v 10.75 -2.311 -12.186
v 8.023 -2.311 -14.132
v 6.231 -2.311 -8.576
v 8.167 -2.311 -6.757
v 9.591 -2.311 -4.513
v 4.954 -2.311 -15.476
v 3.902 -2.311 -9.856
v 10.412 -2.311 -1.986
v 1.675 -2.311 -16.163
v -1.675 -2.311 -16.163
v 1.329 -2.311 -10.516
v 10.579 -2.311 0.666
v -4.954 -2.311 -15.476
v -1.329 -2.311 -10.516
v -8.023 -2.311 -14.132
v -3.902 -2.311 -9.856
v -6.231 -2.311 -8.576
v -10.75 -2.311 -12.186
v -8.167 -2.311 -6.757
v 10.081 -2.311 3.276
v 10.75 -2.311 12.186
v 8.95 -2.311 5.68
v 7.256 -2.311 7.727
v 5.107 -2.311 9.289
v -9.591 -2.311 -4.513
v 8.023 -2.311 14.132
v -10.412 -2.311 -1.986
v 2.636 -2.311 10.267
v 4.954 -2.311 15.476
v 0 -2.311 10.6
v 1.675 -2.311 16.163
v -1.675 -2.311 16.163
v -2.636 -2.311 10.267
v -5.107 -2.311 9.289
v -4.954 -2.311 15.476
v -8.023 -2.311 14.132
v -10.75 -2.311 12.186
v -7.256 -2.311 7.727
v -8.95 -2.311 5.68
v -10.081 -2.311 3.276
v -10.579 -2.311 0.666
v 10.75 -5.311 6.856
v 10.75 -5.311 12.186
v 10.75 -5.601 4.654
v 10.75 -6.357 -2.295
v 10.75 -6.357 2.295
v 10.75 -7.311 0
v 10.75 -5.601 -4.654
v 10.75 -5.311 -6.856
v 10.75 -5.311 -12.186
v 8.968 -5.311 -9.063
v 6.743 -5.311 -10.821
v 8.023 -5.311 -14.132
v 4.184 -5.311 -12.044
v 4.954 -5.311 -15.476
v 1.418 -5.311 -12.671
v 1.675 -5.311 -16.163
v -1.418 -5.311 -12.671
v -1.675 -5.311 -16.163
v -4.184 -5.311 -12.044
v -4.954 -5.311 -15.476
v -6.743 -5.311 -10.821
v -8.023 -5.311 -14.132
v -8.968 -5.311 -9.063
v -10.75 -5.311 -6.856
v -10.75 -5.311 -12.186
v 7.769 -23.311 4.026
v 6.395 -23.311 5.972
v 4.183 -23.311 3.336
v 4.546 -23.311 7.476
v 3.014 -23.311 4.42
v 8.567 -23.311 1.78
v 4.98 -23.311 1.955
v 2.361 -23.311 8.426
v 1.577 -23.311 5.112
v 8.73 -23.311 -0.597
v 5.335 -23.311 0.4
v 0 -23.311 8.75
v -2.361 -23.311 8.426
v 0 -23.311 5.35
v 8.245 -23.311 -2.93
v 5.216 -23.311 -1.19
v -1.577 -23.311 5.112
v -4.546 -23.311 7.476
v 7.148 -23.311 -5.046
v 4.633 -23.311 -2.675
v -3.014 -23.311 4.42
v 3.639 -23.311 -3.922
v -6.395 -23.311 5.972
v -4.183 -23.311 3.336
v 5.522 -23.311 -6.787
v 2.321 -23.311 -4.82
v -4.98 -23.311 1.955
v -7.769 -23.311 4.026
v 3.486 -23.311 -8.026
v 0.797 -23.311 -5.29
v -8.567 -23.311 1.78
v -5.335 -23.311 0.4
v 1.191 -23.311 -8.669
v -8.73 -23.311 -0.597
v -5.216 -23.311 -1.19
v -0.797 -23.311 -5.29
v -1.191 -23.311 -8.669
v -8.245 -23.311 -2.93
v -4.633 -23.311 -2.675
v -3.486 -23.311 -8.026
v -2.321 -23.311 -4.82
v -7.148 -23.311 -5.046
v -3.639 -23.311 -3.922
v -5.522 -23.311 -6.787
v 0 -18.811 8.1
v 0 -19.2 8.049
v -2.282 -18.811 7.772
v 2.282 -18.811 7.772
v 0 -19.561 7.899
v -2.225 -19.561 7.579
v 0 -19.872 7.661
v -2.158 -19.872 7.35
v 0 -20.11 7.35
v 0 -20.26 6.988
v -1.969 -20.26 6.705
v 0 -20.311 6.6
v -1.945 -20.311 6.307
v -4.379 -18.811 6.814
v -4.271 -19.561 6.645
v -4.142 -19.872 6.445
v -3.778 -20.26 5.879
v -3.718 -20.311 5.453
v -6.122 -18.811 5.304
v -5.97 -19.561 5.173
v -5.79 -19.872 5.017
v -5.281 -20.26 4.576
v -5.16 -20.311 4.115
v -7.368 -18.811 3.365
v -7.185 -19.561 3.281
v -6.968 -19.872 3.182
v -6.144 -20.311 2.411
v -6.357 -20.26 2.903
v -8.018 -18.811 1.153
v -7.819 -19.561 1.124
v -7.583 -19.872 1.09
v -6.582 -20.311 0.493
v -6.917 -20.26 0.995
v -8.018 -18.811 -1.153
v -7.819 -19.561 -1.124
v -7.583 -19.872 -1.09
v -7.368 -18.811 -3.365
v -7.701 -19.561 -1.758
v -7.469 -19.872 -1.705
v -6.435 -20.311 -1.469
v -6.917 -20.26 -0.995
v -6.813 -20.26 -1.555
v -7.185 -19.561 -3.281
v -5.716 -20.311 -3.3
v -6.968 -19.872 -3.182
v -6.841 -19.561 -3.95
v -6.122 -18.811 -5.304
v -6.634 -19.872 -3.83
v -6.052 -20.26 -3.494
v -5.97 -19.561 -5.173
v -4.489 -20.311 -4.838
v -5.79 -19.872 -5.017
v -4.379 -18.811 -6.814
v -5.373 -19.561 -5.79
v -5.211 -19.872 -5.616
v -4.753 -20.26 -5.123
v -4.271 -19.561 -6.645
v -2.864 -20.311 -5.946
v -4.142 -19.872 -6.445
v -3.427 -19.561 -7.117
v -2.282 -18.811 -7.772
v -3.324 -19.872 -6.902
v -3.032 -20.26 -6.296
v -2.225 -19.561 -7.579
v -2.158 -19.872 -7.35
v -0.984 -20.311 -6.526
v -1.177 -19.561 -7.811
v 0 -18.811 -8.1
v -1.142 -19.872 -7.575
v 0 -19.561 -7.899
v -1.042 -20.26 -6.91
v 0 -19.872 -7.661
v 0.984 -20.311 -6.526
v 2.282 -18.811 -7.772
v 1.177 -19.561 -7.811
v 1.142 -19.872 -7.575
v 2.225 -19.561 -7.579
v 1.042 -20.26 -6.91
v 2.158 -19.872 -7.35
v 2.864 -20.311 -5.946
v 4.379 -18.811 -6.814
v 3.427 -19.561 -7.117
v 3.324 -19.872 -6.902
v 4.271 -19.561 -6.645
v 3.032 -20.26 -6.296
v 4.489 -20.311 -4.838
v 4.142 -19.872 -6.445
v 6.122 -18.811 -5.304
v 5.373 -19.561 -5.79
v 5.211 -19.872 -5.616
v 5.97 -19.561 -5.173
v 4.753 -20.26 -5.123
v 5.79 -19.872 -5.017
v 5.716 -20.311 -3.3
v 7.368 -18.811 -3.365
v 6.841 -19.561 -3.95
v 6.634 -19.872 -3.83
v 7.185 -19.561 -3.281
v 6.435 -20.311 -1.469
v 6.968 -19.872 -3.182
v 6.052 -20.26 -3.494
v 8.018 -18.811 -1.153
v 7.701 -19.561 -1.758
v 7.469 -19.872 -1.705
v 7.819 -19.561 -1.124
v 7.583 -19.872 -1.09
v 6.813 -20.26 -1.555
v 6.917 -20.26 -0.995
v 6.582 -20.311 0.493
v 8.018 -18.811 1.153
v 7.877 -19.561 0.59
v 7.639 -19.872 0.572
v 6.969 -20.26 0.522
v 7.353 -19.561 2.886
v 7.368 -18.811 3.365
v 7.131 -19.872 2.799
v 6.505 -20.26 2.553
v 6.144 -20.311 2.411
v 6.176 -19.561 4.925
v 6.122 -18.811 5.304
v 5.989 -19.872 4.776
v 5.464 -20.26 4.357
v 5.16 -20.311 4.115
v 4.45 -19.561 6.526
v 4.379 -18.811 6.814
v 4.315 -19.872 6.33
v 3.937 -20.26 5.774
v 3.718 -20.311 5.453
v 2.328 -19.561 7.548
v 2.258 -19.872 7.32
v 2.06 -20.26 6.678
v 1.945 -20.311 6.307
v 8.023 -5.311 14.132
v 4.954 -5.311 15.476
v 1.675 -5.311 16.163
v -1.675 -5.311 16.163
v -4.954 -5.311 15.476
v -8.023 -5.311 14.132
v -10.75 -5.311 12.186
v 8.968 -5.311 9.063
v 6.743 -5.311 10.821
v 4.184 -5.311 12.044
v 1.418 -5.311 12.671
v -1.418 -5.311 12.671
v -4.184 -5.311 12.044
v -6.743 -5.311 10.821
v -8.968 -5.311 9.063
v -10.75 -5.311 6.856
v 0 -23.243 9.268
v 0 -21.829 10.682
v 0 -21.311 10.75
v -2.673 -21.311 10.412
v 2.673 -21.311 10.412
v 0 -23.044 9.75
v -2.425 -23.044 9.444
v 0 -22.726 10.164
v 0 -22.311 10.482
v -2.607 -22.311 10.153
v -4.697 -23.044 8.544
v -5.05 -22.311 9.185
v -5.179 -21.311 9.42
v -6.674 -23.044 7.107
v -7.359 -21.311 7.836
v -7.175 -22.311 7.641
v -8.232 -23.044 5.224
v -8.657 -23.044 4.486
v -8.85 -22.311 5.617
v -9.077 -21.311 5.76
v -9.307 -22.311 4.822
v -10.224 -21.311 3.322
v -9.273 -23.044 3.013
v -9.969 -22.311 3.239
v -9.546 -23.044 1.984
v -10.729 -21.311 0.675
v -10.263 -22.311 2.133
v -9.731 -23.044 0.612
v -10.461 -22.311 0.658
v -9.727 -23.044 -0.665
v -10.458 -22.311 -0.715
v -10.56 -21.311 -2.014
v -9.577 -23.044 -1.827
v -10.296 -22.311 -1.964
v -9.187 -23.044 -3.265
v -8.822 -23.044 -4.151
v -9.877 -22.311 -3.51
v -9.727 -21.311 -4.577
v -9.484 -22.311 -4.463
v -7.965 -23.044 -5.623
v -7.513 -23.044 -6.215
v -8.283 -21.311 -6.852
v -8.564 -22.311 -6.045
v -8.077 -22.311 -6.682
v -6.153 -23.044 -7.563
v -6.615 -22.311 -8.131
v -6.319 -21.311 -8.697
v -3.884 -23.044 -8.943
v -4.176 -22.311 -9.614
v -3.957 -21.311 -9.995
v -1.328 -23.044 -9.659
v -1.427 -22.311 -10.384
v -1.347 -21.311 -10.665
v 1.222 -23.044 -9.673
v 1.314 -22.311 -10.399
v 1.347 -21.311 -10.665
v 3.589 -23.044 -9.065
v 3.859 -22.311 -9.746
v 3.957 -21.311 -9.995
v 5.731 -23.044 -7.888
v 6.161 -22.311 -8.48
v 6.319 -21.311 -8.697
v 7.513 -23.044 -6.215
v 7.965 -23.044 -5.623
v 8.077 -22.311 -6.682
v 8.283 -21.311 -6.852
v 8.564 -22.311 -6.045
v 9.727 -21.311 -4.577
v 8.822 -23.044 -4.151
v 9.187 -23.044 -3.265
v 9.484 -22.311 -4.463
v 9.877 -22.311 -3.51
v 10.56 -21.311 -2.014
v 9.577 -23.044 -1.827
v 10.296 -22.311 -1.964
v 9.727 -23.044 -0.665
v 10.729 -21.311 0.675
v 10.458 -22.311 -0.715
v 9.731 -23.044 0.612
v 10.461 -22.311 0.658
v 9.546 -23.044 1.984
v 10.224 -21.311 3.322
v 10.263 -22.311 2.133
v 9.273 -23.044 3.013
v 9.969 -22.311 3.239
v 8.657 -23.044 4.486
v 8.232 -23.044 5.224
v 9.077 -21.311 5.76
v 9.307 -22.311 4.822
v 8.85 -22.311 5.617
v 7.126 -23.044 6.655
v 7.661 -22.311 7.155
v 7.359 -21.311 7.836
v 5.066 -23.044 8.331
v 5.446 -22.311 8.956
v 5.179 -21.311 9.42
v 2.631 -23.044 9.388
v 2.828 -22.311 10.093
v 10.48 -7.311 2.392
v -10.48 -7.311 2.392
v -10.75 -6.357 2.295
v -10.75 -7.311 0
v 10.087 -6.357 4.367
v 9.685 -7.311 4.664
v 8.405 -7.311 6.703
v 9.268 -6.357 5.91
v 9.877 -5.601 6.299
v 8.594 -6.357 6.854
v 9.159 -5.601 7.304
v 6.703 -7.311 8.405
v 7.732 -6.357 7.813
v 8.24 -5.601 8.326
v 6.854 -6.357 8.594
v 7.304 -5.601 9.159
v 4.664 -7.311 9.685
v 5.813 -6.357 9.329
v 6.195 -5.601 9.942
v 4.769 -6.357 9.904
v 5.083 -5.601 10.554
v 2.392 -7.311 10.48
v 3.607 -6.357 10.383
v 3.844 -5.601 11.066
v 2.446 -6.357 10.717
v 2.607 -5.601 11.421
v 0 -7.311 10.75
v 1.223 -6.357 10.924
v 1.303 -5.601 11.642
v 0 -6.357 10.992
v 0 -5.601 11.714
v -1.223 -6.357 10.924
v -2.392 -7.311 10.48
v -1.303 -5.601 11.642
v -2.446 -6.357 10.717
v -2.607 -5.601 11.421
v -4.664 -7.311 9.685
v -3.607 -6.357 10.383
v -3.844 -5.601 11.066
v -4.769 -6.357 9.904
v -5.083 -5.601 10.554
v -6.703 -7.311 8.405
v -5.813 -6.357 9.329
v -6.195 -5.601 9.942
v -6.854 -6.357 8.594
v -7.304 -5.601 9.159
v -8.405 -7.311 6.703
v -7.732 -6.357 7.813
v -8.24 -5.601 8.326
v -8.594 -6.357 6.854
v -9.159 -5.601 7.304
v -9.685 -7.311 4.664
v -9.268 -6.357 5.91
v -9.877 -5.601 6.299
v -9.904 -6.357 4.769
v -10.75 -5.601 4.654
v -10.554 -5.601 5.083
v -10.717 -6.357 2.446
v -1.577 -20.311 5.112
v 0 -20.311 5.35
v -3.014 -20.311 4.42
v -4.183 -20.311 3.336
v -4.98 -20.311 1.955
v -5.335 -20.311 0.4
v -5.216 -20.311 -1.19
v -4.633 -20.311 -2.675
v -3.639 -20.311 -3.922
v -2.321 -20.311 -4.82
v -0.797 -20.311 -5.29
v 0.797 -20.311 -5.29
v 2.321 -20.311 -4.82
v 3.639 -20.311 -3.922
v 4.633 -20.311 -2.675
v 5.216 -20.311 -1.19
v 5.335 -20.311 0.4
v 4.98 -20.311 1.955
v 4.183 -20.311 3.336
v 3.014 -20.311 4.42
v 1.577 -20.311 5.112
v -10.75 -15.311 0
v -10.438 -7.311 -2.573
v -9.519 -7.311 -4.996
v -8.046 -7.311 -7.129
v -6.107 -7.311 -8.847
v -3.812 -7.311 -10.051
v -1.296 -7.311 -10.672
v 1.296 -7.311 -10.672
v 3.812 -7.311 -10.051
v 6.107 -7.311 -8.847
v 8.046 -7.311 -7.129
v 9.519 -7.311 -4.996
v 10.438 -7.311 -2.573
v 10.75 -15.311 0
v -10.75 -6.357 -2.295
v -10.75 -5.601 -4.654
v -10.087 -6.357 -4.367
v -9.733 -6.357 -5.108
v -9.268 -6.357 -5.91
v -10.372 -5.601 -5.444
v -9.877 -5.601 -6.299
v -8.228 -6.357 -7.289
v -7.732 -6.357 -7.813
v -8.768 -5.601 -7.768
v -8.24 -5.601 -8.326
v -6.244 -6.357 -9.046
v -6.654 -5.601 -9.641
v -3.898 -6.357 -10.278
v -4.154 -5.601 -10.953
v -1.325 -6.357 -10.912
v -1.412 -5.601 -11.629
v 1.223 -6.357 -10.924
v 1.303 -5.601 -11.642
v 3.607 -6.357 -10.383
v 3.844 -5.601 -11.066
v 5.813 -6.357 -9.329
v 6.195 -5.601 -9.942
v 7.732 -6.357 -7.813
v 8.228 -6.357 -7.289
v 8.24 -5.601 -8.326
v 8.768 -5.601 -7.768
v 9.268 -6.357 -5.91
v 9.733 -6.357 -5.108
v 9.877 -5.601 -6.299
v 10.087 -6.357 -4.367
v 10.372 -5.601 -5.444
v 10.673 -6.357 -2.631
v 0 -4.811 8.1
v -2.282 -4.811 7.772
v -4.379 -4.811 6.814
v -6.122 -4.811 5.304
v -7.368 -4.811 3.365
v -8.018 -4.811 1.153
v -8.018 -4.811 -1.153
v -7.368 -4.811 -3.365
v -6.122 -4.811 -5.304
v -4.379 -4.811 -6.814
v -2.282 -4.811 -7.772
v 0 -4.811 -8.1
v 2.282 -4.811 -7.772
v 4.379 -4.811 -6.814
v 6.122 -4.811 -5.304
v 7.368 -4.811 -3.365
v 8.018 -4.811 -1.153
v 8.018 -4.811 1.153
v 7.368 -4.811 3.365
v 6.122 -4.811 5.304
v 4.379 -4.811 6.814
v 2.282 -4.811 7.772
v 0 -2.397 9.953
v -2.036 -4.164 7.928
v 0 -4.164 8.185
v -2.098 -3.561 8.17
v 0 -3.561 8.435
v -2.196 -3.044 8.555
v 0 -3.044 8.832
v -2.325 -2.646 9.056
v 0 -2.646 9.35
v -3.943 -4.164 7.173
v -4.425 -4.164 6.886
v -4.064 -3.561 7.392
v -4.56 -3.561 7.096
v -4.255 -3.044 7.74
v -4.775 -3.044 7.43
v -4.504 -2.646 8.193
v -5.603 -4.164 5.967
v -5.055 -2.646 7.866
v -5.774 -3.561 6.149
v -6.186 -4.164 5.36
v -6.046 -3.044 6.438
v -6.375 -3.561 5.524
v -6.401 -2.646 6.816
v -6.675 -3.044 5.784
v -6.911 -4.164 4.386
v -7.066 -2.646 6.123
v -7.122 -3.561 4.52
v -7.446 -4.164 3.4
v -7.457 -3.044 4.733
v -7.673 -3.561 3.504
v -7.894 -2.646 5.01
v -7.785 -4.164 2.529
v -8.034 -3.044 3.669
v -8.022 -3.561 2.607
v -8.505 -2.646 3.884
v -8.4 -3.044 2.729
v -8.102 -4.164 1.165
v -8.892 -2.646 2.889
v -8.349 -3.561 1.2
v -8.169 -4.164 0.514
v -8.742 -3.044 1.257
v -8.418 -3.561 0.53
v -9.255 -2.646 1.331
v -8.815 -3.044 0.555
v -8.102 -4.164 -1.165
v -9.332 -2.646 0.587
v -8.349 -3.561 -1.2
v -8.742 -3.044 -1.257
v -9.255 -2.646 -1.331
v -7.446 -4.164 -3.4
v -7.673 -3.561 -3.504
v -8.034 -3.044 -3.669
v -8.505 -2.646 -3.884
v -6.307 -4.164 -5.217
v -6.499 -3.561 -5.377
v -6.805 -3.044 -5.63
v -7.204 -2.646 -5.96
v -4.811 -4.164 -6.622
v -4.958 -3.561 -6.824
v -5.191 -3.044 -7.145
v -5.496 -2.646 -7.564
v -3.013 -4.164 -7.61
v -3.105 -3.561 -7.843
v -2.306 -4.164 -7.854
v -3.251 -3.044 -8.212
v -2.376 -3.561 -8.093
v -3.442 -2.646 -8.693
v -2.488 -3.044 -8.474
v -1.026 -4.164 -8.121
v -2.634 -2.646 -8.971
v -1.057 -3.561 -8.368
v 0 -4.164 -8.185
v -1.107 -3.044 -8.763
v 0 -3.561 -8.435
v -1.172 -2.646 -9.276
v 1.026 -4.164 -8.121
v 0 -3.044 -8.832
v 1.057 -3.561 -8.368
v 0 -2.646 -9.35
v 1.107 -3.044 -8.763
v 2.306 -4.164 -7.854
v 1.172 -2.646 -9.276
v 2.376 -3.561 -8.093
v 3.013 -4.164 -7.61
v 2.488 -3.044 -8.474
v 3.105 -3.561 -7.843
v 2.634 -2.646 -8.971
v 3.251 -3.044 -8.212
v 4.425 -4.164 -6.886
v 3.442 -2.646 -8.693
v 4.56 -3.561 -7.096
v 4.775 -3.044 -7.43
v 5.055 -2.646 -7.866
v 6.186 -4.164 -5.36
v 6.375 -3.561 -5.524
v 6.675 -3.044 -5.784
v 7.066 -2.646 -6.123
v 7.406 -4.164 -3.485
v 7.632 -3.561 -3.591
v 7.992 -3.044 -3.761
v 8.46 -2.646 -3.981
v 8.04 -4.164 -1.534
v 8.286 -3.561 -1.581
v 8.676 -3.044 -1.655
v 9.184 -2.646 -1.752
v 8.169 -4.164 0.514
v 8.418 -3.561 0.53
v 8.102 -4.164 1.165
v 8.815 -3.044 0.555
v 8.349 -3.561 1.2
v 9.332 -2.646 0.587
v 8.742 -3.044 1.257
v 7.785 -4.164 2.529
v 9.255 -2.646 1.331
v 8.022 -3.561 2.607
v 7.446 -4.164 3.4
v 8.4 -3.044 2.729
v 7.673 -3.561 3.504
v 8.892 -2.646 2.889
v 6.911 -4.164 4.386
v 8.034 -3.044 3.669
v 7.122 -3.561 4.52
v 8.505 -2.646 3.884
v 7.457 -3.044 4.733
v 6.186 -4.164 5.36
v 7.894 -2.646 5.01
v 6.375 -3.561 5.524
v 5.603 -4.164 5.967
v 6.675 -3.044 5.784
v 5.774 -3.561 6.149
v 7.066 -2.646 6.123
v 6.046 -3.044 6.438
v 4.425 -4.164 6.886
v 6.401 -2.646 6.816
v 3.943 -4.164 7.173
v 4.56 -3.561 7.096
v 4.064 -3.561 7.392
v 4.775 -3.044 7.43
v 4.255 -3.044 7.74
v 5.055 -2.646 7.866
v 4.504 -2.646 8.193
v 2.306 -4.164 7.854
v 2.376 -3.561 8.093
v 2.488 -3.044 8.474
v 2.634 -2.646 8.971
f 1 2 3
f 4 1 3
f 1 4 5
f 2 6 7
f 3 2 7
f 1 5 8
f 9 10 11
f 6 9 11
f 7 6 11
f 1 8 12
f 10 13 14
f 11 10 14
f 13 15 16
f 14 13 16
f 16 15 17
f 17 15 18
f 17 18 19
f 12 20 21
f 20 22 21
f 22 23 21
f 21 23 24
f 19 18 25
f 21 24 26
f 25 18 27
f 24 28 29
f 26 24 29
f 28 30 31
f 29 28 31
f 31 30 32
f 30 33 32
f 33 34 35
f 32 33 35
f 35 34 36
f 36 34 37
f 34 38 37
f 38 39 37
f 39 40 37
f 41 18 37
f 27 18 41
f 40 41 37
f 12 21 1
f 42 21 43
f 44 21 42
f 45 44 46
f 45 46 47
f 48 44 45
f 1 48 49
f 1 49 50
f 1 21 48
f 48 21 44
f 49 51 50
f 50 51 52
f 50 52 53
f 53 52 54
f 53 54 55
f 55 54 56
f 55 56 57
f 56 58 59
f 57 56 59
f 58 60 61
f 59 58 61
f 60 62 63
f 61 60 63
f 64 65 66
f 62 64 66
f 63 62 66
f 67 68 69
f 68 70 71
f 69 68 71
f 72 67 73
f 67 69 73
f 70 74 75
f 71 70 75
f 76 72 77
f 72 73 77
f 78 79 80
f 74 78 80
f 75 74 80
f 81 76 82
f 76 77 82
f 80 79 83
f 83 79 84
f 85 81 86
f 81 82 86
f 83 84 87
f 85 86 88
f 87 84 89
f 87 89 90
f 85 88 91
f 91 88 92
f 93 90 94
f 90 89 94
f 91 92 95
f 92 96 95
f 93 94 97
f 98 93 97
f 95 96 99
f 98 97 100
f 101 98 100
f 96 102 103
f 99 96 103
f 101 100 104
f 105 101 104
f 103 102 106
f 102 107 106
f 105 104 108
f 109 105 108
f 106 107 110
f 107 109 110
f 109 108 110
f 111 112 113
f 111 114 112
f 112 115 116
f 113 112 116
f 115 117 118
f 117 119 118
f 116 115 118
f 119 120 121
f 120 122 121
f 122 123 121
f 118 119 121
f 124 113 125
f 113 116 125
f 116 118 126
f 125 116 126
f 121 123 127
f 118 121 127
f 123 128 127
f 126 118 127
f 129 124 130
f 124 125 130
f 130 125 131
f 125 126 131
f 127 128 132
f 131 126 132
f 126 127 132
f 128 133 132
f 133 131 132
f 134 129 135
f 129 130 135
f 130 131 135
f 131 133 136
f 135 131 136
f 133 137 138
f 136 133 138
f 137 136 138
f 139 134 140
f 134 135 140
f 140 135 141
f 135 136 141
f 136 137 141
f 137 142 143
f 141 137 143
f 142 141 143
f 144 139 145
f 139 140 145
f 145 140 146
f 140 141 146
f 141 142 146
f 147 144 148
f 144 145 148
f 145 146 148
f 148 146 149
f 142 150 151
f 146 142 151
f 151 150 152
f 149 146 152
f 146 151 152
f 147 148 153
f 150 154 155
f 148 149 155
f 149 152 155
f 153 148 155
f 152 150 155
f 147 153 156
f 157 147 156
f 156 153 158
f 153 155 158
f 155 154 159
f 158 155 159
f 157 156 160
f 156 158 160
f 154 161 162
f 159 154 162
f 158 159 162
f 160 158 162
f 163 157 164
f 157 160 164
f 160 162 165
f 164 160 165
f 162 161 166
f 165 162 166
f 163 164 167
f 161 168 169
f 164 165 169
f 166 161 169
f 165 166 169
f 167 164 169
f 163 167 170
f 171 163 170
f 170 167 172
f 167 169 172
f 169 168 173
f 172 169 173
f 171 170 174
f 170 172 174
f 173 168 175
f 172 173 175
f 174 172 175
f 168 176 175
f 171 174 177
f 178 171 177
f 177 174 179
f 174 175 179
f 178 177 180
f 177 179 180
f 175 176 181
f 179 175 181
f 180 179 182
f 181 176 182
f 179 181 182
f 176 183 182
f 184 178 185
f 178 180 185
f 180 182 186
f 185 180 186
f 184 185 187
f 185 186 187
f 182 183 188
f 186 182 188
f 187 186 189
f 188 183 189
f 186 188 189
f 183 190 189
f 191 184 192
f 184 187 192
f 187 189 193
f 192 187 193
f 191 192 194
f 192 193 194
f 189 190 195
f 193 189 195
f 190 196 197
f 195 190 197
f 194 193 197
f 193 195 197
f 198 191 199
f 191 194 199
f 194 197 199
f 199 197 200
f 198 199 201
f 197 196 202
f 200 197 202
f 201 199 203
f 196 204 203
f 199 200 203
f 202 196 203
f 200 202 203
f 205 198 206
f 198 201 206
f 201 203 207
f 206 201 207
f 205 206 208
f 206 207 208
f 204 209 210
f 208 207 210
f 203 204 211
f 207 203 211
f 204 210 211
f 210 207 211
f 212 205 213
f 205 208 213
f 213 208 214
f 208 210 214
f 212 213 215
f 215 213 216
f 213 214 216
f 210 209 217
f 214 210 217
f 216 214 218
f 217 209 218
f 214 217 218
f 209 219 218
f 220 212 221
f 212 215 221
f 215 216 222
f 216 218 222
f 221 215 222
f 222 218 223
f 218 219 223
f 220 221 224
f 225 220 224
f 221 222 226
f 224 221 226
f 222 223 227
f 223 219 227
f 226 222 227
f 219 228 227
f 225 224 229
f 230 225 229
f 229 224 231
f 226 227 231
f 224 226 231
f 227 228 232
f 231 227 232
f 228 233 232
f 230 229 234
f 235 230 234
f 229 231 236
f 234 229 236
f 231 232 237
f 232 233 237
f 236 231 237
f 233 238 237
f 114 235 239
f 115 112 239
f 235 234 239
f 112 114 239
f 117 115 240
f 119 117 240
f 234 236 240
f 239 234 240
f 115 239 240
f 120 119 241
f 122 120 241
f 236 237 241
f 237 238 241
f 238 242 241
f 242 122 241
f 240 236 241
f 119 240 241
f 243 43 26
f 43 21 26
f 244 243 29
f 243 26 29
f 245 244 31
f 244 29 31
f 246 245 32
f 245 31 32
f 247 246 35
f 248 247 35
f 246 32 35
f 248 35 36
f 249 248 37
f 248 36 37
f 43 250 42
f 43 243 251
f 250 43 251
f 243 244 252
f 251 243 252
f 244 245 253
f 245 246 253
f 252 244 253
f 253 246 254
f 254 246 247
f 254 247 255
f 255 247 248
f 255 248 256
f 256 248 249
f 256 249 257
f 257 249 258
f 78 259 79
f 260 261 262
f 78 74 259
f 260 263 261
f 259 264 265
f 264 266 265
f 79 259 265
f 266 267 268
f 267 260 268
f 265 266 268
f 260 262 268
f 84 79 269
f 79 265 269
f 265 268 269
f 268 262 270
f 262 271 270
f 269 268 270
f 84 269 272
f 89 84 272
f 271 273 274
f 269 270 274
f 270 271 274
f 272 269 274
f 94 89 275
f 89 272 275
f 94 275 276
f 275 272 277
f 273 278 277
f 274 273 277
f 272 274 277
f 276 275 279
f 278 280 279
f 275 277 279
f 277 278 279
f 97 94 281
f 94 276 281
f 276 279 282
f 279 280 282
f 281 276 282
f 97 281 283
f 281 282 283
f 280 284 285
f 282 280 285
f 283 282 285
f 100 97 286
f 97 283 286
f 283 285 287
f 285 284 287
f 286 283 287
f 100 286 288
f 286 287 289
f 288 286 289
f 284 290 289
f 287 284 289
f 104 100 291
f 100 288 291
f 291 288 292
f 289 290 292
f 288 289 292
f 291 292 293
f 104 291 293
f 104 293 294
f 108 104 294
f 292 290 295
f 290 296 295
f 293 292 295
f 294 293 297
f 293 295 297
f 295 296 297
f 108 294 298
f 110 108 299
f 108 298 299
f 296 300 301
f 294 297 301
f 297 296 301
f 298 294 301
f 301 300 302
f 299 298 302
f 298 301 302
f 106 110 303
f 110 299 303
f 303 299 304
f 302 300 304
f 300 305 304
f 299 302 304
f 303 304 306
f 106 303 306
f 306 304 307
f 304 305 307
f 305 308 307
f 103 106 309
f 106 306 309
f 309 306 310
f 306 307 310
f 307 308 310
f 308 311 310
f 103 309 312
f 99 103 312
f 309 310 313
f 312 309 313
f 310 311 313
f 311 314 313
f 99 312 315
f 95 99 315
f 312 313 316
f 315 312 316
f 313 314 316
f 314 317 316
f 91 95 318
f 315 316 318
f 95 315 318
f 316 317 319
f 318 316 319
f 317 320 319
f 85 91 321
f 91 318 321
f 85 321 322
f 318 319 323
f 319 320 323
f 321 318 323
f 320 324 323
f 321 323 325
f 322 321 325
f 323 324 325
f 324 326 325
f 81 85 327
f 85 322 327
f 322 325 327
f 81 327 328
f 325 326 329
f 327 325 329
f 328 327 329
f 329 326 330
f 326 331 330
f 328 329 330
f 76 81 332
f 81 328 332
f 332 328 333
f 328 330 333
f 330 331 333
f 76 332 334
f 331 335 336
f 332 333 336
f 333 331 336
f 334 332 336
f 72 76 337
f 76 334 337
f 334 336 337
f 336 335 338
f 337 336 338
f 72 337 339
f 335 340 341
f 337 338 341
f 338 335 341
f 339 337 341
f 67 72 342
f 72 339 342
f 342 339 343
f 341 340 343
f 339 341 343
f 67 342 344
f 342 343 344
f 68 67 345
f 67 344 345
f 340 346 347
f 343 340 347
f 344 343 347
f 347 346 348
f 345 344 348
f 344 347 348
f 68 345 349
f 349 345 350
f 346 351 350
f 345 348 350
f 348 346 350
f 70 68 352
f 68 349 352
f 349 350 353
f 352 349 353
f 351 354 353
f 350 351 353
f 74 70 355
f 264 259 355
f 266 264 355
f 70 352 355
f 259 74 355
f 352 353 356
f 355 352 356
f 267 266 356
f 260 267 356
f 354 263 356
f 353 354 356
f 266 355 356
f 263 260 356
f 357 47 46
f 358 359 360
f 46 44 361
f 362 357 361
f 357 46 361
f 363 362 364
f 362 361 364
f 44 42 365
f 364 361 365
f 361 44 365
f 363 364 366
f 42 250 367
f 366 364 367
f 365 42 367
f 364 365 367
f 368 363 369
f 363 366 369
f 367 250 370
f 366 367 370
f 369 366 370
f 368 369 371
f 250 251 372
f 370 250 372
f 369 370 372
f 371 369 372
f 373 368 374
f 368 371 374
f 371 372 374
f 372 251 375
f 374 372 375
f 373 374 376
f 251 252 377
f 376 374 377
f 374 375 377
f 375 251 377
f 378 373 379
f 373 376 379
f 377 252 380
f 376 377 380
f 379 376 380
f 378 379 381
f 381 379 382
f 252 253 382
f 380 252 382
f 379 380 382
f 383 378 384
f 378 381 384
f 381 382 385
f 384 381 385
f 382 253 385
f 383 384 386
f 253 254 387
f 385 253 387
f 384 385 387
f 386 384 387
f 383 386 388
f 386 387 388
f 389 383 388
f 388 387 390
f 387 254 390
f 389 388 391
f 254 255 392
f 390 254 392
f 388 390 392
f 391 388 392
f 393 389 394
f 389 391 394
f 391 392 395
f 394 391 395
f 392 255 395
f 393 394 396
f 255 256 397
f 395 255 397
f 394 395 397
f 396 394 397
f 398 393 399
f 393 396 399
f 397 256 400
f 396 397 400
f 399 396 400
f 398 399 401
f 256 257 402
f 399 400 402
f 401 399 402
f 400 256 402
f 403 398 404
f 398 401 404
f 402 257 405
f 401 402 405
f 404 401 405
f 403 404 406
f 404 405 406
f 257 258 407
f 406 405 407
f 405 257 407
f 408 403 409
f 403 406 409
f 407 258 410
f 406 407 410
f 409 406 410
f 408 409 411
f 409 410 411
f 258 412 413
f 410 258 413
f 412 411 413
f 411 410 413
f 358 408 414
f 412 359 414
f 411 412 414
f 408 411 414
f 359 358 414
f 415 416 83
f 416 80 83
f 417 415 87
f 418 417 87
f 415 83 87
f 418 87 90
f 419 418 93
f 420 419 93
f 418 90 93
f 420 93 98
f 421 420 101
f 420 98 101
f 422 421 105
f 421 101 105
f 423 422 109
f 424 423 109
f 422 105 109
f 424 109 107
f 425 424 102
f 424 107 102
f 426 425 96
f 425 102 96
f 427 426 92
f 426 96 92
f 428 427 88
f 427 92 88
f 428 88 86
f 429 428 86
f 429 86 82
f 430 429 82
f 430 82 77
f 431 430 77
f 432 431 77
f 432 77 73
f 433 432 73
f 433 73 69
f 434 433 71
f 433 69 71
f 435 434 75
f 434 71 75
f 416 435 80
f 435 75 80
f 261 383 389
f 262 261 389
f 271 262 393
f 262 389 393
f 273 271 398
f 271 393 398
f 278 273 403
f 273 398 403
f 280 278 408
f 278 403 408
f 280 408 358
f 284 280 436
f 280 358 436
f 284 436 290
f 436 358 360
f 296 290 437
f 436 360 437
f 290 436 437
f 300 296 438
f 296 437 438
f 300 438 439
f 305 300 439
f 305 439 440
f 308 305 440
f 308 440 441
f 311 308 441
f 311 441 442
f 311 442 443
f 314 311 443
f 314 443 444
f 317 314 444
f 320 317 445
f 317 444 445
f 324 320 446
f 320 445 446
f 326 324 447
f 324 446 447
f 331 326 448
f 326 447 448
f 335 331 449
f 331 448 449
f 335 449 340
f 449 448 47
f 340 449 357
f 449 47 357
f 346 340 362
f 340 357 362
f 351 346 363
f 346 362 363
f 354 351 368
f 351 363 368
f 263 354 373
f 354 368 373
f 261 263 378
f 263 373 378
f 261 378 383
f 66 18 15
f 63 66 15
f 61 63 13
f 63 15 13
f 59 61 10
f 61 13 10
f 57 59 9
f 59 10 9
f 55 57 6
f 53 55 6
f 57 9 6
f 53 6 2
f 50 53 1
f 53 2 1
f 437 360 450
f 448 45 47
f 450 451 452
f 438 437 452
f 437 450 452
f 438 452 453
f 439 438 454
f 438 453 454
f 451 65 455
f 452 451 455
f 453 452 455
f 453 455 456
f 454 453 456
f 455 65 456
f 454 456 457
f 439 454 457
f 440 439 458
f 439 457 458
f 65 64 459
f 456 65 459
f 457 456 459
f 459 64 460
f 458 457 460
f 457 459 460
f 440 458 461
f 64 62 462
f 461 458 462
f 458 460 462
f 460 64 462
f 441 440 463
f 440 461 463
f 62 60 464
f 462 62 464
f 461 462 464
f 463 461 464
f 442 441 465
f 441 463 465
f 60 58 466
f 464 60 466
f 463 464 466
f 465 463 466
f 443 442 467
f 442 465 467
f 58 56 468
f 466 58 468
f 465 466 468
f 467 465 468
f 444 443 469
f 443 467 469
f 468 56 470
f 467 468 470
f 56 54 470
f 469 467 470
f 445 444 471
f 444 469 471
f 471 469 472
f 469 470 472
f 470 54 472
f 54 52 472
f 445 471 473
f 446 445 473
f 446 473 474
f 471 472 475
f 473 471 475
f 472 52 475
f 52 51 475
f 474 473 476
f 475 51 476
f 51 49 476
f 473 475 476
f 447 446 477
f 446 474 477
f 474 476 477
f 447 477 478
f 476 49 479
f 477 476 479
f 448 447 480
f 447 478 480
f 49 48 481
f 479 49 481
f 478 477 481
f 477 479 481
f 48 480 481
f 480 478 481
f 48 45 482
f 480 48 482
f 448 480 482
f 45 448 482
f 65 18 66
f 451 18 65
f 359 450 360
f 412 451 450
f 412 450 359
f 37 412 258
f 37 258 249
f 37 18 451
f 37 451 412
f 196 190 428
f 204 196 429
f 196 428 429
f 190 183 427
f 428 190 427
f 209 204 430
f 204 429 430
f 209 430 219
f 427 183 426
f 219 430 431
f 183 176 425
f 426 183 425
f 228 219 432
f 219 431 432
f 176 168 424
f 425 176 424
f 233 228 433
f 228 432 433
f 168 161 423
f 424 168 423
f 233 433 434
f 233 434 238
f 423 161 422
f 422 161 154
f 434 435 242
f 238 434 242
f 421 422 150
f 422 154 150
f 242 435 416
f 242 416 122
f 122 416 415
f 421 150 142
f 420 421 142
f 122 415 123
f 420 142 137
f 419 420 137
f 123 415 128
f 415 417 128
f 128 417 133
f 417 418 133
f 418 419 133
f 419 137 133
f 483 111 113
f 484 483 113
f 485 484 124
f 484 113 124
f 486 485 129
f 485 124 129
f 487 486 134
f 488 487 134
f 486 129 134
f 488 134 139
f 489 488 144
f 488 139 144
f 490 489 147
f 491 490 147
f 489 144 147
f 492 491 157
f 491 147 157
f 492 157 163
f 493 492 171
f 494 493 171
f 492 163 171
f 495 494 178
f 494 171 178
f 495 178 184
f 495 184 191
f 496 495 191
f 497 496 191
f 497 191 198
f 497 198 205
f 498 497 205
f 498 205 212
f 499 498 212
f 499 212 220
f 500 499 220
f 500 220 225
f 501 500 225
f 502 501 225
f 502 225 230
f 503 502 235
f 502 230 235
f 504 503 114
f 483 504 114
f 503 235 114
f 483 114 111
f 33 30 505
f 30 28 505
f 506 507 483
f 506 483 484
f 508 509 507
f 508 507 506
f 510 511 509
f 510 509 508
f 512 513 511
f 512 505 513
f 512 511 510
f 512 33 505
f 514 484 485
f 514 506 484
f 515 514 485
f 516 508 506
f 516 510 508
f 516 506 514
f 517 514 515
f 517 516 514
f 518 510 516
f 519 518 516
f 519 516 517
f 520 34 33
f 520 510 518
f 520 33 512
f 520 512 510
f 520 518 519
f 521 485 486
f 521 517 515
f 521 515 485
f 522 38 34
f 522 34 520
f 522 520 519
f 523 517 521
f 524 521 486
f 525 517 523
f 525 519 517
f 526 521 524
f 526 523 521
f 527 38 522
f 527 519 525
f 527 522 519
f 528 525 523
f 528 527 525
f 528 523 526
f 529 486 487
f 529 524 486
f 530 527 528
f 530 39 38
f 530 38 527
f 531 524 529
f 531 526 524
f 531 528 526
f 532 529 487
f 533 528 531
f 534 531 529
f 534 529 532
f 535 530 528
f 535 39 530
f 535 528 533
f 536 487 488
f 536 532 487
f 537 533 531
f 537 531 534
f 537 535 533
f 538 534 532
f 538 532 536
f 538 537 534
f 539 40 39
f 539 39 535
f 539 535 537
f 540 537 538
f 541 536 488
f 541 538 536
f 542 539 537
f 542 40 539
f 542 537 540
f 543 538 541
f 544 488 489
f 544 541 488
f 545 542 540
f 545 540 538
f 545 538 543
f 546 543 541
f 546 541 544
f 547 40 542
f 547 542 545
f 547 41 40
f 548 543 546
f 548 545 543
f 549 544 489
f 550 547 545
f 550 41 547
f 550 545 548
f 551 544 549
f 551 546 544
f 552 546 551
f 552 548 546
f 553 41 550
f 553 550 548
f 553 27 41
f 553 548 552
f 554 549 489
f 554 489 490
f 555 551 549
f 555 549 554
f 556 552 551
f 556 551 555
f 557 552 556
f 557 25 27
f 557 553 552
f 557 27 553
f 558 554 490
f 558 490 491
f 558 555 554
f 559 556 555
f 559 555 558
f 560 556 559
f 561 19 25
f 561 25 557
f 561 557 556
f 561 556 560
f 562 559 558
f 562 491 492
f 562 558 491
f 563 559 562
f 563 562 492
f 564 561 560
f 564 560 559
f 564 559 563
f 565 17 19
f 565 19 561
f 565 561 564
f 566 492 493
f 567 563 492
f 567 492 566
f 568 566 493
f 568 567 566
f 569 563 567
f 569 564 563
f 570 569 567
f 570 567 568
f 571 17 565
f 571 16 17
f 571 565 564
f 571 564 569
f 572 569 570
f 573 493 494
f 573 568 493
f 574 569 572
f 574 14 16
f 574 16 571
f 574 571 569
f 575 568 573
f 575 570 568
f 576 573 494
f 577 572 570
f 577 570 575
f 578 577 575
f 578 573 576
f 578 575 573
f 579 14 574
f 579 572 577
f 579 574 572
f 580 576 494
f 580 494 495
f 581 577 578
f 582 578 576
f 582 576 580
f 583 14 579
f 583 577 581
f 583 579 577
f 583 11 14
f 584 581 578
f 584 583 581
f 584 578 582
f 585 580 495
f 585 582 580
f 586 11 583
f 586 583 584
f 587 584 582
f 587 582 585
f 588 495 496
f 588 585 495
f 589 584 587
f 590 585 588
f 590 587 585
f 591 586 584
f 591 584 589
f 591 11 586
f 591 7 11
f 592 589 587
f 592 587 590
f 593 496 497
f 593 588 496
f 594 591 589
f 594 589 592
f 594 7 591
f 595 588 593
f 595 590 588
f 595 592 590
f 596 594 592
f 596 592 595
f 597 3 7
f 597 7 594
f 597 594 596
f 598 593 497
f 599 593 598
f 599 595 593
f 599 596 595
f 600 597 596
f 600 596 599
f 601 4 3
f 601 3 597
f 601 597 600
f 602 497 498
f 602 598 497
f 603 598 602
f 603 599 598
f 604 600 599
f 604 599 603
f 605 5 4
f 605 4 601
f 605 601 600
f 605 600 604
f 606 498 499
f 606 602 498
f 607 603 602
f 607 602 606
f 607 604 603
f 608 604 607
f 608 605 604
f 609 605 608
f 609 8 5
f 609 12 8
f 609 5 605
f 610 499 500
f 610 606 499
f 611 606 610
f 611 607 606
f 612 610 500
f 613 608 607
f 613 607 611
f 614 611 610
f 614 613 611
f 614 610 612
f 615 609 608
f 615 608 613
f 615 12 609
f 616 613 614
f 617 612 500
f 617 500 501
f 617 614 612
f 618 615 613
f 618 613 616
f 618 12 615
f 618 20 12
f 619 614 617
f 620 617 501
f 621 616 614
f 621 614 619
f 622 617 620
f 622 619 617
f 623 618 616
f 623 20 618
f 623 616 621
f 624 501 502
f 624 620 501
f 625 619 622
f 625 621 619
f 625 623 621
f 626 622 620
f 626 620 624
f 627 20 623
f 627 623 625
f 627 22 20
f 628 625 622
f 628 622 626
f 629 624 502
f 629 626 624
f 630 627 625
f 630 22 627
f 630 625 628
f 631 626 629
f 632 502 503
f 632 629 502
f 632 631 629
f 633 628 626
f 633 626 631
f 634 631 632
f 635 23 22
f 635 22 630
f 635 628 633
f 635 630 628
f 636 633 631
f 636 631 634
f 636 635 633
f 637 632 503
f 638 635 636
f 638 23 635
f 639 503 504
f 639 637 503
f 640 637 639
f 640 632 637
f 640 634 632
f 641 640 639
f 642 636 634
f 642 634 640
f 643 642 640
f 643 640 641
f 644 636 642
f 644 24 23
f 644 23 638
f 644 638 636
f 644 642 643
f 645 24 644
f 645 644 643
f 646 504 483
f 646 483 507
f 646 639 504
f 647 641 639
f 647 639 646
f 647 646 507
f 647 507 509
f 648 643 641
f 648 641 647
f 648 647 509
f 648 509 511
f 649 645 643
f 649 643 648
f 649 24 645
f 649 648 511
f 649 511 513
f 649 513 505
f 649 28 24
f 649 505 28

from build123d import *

# Parameters (mm, degrees)
FILETE1_R                  = 2.5
FILETE2_R                  = 1.5
FILETE3_R                  = 2
FILETE4_R                  = 2
CORTE_EXTRUS_O2_DEPTH      = 10
CORTE_EXTRUS_O2_DEPTH_BACK = 10
ESBO_O3_OUTSIDE_W          = 44.606
ESBO_O3_OUTSIDE_H          = 44.606


with BuildPart() as part:
    # Esboço1 → Revolução1 (revolve)
    with BuildSketch(Plane.XY, mode=Mode.PRIVATE) as revolu_o1_sk:
        Polygon((8.1, -2.311461794), (8.1, -20.311461794), (5.35, -20.311461794), (5.35, -23.311461794), (10.75, -23.311461794), (10.75, -5.311461794), (16.25, -5.311461794), (16.25, -2.311461794), align=None)
    revolve(revolu_o1_sk.sketch.rotate(Axis((0, 66.826190476, 0), (0, -1, 0)), 90), axis=Axis((0, 66.826190476, 0), (0, -1, 0)))

    # Filete1
    filete1_edges = [part.edges().sort_by_distance(p)[0] for p in [
        (0, -2.311461794, -8.1),
    ]]
    fillet(filete1_edges, radius=FILETE1_R)

    # Filete2
    filete2_edges = [part.edges().sort_by_distance(p)[0] for p in [
        (0, -20.311461794, -8.1),
    ]]
    fillet(filete2_edges, radius=FILETE2_R)

    # Filete3
    filete3_edges = [part.edges().sort_by_distance(p)[0] for p in [
        (0, -23.311461794, -10.75),
    ]]
    fillet(filete3_edges, radius=FILETE3_R)

    # Filete4
    filete4_edges = [part.edges().sort_by_distance(p)[0] for p in [
        (0, -5.311461794, -10.75),
    ]]
    fillet(filete4_edges, radius=FILETE4_R)

    # Esboço3 outside → Corte-extrusão2 (cut, two sides: drawn at the far end of the back side and taken through both)
    with BuildSketch(Plane.XZ.offset(5.311461794).offset(-CORTE_EXTRUS_O2_DEPTH_BACK)):
        Rectangle(ESBO_O3_OUTSIDE_W, ESBO_O3_OUTSIDE_H)
        Polygon((-10.75, 0), (-10.75, -18.400139995), (10.75, -18.400139995), (10.75, 0), (10.75, 16.970186259), (-10.75, 16.970186259), align=None, mode=Mode.SUBTRACT)
    extrude(amount=CORTE_EXTRUS_O2_DEPTH + CORTE_EXTRUS_O2_DEPTH_BACK, mode=Mode.SUBTRACT)


solid = part.part
